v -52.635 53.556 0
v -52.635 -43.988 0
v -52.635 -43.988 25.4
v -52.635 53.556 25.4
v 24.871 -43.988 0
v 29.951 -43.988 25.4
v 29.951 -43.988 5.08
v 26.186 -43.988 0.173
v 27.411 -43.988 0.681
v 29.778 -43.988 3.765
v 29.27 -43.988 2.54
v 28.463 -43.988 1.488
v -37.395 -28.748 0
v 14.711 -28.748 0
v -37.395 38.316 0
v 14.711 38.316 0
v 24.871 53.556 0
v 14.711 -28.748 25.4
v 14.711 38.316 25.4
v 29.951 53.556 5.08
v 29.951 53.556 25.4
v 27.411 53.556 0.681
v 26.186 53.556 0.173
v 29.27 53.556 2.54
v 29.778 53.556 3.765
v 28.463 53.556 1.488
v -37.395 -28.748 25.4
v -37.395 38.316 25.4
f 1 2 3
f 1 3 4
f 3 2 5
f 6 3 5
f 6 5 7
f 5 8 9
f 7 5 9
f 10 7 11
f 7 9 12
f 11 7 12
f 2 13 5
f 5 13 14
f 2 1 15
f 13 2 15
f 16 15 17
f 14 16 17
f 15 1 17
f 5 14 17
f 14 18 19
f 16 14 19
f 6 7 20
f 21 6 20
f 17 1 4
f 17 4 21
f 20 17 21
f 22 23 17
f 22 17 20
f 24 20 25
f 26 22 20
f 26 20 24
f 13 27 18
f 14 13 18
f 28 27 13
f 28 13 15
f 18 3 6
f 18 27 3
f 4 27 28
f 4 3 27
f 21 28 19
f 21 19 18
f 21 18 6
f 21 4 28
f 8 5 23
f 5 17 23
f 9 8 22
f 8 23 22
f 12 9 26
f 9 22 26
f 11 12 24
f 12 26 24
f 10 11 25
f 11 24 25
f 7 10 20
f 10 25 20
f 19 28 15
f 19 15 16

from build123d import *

# Parameters (mm, degrees)
F0_W     = 82.585936
F0_H     = 97.54353
F1_DEPTH = 25.4
F2_W     = 52.105936
F2_H     = 67.06353
F3_DEPTH = 25.4
F4_R     = 5.08


with BuildPart() as f1:
    # F0 (on Top) → F1 (new body)
    with BuildSketch(Plane.XY):
        with Locations((-11.342247, 4.783943)):
            Rectangle(F0_W, F0_H)
    extrude(amount=F1_DEPTH)

    # F2 (on face) → F3 (cut)
    with BuildSketch(Plane.XY.offset(25.4)):
        with Locations((-11.342247, 4.783943)):
            Rectangle(F2_W, F2_H)
    extrude(amount=-F3_DEPTH, mode=Mode.SUBTRACT)

    # F4
    f4_edges = [f1.edges().sort_by_distance(p)[0] for p in [
        (29.950721, 4.783943, 0),
    ]]
    fillet(f4_edges, radius=F4_R)


solid = f1.part
